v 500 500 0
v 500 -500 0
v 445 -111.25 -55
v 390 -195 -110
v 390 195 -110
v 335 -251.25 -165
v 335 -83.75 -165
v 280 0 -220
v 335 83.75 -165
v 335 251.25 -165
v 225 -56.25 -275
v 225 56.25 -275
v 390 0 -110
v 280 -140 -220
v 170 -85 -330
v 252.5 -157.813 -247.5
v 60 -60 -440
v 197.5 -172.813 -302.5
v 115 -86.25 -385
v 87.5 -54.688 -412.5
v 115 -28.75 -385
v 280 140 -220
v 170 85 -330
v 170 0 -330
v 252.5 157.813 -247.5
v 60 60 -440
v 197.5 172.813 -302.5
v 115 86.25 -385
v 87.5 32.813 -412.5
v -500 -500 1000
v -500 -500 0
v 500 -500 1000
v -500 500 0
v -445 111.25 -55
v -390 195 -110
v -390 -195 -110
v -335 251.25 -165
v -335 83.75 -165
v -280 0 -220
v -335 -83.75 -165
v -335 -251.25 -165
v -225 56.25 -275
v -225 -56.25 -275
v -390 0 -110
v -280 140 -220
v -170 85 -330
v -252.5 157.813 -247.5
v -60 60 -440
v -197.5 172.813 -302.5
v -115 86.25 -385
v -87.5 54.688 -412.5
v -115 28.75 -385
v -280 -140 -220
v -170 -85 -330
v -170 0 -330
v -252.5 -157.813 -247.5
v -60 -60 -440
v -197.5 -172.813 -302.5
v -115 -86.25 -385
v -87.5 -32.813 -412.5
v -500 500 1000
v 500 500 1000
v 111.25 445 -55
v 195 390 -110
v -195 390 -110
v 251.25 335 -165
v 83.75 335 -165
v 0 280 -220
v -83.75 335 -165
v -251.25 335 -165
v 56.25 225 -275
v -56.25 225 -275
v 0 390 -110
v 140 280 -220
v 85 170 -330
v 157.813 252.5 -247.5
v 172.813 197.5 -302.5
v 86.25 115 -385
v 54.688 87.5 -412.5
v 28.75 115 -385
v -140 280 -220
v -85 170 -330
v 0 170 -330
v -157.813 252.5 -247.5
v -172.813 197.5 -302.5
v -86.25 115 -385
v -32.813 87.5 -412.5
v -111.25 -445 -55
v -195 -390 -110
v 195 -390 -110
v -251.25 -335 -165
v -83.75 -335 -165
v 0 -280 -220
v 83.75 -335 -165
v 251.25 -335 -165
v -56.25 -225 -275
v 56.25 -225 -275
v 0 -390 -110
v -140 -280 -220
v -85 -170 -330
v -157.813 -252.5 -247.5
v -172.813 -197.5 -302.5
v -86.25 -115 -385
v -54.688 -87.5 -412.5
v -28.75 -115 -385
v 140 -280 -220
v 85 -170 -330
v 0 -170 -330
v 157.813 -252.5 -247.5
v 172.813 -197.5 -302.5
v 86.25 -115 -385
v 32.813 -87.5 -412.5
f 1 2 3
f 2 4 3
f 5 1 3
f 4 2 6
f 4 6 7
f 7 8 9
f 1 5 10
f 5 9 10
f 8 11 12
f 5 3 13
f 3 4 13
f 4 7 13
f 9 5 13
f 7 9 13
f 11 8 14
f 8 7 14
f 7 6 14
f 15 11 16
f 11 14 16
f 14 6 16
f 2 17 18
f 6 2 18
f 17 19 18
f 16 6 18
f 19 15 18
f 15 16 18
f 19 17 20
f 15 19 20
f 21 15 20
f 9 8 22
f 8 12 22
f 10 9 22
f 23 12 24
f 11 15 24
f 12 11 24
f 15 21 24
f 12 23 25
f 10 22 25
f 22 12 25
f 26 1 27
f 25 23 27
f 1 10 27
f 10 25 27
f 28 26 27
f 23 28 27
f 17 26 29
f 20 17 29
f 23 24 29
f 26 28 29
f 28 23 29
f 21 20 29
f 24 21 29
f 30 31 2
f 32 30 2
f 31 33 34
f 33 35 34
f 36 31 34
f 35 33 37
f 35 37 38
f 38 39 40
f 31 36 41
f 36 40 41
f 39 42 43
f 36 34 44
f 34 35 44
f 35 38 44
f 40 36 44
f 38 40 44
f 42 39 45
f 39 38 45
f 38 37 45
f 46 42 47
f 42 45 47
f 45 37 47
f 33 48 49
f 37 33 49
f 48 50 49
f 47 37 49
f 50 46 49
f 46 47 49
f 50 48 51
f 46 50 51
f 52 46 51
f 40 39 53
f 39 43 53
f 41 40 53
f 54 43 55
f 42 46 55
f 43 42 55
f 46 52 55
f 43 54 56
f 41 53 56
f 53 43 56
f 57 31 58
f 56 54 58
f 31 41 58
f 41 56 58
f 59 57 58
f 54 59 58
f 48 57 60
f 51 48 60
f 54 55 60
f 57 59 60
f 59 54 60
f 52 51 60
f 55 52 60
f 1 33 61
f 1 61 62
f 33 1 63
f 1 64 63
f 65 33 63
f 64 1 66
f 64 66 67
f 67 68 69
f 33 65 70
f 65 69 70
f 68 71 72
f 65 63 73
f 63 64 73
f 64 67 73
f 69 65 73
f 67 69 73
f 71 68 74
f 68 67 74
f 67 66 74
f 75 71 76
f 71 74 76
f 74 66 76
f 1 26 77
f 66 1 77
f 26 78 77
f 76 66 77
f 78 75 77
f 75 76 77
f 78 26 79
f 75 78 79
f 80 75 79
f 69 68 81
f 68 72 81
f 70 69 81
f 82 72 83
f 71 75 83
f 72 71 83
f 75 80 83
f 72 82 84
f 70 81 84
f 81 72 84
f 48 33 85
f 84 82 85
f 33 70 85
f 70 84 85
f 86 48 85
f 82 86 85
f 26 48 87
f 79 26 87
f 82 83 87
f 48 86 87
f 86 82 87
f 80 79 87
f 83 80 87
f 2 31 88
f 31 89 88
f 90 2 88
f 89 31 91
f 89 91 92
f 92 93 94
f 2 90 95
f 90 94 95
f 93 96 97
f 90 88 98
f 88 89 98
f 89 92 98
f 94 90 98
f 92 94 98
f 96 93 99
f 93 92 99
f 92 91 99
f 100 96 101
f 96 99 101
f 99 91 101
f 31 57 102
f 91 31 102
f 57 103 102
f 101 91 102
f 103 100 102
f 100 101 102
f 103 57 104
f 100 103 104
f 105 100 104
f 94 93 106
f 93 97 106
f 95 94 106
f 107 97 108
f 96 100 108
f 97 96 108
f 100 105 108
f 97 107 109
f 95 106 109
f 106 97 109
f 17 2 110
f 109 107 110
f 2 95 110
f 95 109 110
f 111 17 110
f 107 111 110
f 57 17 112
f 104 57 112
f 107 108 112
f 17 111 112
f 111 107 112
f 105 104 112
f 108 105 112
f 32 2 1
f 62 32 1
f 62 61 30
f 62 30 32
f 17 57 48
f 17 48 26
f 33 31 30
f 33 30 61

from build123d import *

# Parameters (mm, degrees)
F0_W          = 1000
F0_H          = 1000
F1_DEPTH      = 1000
F1_DEPTH_BACK = 440
F1_TAPER_BACK = 45


with BuildPart() as f1:
    # F0 (on Top) → F1 (new body, two sides)
    with BuildSketch(Plane.XY) as f1_sk:
        Rectangle(F0_W, F0_H)
    extrude(amount=F1_DEPTH)
    extrude(f1_sk.sketch, amount=-F1_DEPTH_BACK, taper=F1_TAPER_BACK)


solid = f1.part
